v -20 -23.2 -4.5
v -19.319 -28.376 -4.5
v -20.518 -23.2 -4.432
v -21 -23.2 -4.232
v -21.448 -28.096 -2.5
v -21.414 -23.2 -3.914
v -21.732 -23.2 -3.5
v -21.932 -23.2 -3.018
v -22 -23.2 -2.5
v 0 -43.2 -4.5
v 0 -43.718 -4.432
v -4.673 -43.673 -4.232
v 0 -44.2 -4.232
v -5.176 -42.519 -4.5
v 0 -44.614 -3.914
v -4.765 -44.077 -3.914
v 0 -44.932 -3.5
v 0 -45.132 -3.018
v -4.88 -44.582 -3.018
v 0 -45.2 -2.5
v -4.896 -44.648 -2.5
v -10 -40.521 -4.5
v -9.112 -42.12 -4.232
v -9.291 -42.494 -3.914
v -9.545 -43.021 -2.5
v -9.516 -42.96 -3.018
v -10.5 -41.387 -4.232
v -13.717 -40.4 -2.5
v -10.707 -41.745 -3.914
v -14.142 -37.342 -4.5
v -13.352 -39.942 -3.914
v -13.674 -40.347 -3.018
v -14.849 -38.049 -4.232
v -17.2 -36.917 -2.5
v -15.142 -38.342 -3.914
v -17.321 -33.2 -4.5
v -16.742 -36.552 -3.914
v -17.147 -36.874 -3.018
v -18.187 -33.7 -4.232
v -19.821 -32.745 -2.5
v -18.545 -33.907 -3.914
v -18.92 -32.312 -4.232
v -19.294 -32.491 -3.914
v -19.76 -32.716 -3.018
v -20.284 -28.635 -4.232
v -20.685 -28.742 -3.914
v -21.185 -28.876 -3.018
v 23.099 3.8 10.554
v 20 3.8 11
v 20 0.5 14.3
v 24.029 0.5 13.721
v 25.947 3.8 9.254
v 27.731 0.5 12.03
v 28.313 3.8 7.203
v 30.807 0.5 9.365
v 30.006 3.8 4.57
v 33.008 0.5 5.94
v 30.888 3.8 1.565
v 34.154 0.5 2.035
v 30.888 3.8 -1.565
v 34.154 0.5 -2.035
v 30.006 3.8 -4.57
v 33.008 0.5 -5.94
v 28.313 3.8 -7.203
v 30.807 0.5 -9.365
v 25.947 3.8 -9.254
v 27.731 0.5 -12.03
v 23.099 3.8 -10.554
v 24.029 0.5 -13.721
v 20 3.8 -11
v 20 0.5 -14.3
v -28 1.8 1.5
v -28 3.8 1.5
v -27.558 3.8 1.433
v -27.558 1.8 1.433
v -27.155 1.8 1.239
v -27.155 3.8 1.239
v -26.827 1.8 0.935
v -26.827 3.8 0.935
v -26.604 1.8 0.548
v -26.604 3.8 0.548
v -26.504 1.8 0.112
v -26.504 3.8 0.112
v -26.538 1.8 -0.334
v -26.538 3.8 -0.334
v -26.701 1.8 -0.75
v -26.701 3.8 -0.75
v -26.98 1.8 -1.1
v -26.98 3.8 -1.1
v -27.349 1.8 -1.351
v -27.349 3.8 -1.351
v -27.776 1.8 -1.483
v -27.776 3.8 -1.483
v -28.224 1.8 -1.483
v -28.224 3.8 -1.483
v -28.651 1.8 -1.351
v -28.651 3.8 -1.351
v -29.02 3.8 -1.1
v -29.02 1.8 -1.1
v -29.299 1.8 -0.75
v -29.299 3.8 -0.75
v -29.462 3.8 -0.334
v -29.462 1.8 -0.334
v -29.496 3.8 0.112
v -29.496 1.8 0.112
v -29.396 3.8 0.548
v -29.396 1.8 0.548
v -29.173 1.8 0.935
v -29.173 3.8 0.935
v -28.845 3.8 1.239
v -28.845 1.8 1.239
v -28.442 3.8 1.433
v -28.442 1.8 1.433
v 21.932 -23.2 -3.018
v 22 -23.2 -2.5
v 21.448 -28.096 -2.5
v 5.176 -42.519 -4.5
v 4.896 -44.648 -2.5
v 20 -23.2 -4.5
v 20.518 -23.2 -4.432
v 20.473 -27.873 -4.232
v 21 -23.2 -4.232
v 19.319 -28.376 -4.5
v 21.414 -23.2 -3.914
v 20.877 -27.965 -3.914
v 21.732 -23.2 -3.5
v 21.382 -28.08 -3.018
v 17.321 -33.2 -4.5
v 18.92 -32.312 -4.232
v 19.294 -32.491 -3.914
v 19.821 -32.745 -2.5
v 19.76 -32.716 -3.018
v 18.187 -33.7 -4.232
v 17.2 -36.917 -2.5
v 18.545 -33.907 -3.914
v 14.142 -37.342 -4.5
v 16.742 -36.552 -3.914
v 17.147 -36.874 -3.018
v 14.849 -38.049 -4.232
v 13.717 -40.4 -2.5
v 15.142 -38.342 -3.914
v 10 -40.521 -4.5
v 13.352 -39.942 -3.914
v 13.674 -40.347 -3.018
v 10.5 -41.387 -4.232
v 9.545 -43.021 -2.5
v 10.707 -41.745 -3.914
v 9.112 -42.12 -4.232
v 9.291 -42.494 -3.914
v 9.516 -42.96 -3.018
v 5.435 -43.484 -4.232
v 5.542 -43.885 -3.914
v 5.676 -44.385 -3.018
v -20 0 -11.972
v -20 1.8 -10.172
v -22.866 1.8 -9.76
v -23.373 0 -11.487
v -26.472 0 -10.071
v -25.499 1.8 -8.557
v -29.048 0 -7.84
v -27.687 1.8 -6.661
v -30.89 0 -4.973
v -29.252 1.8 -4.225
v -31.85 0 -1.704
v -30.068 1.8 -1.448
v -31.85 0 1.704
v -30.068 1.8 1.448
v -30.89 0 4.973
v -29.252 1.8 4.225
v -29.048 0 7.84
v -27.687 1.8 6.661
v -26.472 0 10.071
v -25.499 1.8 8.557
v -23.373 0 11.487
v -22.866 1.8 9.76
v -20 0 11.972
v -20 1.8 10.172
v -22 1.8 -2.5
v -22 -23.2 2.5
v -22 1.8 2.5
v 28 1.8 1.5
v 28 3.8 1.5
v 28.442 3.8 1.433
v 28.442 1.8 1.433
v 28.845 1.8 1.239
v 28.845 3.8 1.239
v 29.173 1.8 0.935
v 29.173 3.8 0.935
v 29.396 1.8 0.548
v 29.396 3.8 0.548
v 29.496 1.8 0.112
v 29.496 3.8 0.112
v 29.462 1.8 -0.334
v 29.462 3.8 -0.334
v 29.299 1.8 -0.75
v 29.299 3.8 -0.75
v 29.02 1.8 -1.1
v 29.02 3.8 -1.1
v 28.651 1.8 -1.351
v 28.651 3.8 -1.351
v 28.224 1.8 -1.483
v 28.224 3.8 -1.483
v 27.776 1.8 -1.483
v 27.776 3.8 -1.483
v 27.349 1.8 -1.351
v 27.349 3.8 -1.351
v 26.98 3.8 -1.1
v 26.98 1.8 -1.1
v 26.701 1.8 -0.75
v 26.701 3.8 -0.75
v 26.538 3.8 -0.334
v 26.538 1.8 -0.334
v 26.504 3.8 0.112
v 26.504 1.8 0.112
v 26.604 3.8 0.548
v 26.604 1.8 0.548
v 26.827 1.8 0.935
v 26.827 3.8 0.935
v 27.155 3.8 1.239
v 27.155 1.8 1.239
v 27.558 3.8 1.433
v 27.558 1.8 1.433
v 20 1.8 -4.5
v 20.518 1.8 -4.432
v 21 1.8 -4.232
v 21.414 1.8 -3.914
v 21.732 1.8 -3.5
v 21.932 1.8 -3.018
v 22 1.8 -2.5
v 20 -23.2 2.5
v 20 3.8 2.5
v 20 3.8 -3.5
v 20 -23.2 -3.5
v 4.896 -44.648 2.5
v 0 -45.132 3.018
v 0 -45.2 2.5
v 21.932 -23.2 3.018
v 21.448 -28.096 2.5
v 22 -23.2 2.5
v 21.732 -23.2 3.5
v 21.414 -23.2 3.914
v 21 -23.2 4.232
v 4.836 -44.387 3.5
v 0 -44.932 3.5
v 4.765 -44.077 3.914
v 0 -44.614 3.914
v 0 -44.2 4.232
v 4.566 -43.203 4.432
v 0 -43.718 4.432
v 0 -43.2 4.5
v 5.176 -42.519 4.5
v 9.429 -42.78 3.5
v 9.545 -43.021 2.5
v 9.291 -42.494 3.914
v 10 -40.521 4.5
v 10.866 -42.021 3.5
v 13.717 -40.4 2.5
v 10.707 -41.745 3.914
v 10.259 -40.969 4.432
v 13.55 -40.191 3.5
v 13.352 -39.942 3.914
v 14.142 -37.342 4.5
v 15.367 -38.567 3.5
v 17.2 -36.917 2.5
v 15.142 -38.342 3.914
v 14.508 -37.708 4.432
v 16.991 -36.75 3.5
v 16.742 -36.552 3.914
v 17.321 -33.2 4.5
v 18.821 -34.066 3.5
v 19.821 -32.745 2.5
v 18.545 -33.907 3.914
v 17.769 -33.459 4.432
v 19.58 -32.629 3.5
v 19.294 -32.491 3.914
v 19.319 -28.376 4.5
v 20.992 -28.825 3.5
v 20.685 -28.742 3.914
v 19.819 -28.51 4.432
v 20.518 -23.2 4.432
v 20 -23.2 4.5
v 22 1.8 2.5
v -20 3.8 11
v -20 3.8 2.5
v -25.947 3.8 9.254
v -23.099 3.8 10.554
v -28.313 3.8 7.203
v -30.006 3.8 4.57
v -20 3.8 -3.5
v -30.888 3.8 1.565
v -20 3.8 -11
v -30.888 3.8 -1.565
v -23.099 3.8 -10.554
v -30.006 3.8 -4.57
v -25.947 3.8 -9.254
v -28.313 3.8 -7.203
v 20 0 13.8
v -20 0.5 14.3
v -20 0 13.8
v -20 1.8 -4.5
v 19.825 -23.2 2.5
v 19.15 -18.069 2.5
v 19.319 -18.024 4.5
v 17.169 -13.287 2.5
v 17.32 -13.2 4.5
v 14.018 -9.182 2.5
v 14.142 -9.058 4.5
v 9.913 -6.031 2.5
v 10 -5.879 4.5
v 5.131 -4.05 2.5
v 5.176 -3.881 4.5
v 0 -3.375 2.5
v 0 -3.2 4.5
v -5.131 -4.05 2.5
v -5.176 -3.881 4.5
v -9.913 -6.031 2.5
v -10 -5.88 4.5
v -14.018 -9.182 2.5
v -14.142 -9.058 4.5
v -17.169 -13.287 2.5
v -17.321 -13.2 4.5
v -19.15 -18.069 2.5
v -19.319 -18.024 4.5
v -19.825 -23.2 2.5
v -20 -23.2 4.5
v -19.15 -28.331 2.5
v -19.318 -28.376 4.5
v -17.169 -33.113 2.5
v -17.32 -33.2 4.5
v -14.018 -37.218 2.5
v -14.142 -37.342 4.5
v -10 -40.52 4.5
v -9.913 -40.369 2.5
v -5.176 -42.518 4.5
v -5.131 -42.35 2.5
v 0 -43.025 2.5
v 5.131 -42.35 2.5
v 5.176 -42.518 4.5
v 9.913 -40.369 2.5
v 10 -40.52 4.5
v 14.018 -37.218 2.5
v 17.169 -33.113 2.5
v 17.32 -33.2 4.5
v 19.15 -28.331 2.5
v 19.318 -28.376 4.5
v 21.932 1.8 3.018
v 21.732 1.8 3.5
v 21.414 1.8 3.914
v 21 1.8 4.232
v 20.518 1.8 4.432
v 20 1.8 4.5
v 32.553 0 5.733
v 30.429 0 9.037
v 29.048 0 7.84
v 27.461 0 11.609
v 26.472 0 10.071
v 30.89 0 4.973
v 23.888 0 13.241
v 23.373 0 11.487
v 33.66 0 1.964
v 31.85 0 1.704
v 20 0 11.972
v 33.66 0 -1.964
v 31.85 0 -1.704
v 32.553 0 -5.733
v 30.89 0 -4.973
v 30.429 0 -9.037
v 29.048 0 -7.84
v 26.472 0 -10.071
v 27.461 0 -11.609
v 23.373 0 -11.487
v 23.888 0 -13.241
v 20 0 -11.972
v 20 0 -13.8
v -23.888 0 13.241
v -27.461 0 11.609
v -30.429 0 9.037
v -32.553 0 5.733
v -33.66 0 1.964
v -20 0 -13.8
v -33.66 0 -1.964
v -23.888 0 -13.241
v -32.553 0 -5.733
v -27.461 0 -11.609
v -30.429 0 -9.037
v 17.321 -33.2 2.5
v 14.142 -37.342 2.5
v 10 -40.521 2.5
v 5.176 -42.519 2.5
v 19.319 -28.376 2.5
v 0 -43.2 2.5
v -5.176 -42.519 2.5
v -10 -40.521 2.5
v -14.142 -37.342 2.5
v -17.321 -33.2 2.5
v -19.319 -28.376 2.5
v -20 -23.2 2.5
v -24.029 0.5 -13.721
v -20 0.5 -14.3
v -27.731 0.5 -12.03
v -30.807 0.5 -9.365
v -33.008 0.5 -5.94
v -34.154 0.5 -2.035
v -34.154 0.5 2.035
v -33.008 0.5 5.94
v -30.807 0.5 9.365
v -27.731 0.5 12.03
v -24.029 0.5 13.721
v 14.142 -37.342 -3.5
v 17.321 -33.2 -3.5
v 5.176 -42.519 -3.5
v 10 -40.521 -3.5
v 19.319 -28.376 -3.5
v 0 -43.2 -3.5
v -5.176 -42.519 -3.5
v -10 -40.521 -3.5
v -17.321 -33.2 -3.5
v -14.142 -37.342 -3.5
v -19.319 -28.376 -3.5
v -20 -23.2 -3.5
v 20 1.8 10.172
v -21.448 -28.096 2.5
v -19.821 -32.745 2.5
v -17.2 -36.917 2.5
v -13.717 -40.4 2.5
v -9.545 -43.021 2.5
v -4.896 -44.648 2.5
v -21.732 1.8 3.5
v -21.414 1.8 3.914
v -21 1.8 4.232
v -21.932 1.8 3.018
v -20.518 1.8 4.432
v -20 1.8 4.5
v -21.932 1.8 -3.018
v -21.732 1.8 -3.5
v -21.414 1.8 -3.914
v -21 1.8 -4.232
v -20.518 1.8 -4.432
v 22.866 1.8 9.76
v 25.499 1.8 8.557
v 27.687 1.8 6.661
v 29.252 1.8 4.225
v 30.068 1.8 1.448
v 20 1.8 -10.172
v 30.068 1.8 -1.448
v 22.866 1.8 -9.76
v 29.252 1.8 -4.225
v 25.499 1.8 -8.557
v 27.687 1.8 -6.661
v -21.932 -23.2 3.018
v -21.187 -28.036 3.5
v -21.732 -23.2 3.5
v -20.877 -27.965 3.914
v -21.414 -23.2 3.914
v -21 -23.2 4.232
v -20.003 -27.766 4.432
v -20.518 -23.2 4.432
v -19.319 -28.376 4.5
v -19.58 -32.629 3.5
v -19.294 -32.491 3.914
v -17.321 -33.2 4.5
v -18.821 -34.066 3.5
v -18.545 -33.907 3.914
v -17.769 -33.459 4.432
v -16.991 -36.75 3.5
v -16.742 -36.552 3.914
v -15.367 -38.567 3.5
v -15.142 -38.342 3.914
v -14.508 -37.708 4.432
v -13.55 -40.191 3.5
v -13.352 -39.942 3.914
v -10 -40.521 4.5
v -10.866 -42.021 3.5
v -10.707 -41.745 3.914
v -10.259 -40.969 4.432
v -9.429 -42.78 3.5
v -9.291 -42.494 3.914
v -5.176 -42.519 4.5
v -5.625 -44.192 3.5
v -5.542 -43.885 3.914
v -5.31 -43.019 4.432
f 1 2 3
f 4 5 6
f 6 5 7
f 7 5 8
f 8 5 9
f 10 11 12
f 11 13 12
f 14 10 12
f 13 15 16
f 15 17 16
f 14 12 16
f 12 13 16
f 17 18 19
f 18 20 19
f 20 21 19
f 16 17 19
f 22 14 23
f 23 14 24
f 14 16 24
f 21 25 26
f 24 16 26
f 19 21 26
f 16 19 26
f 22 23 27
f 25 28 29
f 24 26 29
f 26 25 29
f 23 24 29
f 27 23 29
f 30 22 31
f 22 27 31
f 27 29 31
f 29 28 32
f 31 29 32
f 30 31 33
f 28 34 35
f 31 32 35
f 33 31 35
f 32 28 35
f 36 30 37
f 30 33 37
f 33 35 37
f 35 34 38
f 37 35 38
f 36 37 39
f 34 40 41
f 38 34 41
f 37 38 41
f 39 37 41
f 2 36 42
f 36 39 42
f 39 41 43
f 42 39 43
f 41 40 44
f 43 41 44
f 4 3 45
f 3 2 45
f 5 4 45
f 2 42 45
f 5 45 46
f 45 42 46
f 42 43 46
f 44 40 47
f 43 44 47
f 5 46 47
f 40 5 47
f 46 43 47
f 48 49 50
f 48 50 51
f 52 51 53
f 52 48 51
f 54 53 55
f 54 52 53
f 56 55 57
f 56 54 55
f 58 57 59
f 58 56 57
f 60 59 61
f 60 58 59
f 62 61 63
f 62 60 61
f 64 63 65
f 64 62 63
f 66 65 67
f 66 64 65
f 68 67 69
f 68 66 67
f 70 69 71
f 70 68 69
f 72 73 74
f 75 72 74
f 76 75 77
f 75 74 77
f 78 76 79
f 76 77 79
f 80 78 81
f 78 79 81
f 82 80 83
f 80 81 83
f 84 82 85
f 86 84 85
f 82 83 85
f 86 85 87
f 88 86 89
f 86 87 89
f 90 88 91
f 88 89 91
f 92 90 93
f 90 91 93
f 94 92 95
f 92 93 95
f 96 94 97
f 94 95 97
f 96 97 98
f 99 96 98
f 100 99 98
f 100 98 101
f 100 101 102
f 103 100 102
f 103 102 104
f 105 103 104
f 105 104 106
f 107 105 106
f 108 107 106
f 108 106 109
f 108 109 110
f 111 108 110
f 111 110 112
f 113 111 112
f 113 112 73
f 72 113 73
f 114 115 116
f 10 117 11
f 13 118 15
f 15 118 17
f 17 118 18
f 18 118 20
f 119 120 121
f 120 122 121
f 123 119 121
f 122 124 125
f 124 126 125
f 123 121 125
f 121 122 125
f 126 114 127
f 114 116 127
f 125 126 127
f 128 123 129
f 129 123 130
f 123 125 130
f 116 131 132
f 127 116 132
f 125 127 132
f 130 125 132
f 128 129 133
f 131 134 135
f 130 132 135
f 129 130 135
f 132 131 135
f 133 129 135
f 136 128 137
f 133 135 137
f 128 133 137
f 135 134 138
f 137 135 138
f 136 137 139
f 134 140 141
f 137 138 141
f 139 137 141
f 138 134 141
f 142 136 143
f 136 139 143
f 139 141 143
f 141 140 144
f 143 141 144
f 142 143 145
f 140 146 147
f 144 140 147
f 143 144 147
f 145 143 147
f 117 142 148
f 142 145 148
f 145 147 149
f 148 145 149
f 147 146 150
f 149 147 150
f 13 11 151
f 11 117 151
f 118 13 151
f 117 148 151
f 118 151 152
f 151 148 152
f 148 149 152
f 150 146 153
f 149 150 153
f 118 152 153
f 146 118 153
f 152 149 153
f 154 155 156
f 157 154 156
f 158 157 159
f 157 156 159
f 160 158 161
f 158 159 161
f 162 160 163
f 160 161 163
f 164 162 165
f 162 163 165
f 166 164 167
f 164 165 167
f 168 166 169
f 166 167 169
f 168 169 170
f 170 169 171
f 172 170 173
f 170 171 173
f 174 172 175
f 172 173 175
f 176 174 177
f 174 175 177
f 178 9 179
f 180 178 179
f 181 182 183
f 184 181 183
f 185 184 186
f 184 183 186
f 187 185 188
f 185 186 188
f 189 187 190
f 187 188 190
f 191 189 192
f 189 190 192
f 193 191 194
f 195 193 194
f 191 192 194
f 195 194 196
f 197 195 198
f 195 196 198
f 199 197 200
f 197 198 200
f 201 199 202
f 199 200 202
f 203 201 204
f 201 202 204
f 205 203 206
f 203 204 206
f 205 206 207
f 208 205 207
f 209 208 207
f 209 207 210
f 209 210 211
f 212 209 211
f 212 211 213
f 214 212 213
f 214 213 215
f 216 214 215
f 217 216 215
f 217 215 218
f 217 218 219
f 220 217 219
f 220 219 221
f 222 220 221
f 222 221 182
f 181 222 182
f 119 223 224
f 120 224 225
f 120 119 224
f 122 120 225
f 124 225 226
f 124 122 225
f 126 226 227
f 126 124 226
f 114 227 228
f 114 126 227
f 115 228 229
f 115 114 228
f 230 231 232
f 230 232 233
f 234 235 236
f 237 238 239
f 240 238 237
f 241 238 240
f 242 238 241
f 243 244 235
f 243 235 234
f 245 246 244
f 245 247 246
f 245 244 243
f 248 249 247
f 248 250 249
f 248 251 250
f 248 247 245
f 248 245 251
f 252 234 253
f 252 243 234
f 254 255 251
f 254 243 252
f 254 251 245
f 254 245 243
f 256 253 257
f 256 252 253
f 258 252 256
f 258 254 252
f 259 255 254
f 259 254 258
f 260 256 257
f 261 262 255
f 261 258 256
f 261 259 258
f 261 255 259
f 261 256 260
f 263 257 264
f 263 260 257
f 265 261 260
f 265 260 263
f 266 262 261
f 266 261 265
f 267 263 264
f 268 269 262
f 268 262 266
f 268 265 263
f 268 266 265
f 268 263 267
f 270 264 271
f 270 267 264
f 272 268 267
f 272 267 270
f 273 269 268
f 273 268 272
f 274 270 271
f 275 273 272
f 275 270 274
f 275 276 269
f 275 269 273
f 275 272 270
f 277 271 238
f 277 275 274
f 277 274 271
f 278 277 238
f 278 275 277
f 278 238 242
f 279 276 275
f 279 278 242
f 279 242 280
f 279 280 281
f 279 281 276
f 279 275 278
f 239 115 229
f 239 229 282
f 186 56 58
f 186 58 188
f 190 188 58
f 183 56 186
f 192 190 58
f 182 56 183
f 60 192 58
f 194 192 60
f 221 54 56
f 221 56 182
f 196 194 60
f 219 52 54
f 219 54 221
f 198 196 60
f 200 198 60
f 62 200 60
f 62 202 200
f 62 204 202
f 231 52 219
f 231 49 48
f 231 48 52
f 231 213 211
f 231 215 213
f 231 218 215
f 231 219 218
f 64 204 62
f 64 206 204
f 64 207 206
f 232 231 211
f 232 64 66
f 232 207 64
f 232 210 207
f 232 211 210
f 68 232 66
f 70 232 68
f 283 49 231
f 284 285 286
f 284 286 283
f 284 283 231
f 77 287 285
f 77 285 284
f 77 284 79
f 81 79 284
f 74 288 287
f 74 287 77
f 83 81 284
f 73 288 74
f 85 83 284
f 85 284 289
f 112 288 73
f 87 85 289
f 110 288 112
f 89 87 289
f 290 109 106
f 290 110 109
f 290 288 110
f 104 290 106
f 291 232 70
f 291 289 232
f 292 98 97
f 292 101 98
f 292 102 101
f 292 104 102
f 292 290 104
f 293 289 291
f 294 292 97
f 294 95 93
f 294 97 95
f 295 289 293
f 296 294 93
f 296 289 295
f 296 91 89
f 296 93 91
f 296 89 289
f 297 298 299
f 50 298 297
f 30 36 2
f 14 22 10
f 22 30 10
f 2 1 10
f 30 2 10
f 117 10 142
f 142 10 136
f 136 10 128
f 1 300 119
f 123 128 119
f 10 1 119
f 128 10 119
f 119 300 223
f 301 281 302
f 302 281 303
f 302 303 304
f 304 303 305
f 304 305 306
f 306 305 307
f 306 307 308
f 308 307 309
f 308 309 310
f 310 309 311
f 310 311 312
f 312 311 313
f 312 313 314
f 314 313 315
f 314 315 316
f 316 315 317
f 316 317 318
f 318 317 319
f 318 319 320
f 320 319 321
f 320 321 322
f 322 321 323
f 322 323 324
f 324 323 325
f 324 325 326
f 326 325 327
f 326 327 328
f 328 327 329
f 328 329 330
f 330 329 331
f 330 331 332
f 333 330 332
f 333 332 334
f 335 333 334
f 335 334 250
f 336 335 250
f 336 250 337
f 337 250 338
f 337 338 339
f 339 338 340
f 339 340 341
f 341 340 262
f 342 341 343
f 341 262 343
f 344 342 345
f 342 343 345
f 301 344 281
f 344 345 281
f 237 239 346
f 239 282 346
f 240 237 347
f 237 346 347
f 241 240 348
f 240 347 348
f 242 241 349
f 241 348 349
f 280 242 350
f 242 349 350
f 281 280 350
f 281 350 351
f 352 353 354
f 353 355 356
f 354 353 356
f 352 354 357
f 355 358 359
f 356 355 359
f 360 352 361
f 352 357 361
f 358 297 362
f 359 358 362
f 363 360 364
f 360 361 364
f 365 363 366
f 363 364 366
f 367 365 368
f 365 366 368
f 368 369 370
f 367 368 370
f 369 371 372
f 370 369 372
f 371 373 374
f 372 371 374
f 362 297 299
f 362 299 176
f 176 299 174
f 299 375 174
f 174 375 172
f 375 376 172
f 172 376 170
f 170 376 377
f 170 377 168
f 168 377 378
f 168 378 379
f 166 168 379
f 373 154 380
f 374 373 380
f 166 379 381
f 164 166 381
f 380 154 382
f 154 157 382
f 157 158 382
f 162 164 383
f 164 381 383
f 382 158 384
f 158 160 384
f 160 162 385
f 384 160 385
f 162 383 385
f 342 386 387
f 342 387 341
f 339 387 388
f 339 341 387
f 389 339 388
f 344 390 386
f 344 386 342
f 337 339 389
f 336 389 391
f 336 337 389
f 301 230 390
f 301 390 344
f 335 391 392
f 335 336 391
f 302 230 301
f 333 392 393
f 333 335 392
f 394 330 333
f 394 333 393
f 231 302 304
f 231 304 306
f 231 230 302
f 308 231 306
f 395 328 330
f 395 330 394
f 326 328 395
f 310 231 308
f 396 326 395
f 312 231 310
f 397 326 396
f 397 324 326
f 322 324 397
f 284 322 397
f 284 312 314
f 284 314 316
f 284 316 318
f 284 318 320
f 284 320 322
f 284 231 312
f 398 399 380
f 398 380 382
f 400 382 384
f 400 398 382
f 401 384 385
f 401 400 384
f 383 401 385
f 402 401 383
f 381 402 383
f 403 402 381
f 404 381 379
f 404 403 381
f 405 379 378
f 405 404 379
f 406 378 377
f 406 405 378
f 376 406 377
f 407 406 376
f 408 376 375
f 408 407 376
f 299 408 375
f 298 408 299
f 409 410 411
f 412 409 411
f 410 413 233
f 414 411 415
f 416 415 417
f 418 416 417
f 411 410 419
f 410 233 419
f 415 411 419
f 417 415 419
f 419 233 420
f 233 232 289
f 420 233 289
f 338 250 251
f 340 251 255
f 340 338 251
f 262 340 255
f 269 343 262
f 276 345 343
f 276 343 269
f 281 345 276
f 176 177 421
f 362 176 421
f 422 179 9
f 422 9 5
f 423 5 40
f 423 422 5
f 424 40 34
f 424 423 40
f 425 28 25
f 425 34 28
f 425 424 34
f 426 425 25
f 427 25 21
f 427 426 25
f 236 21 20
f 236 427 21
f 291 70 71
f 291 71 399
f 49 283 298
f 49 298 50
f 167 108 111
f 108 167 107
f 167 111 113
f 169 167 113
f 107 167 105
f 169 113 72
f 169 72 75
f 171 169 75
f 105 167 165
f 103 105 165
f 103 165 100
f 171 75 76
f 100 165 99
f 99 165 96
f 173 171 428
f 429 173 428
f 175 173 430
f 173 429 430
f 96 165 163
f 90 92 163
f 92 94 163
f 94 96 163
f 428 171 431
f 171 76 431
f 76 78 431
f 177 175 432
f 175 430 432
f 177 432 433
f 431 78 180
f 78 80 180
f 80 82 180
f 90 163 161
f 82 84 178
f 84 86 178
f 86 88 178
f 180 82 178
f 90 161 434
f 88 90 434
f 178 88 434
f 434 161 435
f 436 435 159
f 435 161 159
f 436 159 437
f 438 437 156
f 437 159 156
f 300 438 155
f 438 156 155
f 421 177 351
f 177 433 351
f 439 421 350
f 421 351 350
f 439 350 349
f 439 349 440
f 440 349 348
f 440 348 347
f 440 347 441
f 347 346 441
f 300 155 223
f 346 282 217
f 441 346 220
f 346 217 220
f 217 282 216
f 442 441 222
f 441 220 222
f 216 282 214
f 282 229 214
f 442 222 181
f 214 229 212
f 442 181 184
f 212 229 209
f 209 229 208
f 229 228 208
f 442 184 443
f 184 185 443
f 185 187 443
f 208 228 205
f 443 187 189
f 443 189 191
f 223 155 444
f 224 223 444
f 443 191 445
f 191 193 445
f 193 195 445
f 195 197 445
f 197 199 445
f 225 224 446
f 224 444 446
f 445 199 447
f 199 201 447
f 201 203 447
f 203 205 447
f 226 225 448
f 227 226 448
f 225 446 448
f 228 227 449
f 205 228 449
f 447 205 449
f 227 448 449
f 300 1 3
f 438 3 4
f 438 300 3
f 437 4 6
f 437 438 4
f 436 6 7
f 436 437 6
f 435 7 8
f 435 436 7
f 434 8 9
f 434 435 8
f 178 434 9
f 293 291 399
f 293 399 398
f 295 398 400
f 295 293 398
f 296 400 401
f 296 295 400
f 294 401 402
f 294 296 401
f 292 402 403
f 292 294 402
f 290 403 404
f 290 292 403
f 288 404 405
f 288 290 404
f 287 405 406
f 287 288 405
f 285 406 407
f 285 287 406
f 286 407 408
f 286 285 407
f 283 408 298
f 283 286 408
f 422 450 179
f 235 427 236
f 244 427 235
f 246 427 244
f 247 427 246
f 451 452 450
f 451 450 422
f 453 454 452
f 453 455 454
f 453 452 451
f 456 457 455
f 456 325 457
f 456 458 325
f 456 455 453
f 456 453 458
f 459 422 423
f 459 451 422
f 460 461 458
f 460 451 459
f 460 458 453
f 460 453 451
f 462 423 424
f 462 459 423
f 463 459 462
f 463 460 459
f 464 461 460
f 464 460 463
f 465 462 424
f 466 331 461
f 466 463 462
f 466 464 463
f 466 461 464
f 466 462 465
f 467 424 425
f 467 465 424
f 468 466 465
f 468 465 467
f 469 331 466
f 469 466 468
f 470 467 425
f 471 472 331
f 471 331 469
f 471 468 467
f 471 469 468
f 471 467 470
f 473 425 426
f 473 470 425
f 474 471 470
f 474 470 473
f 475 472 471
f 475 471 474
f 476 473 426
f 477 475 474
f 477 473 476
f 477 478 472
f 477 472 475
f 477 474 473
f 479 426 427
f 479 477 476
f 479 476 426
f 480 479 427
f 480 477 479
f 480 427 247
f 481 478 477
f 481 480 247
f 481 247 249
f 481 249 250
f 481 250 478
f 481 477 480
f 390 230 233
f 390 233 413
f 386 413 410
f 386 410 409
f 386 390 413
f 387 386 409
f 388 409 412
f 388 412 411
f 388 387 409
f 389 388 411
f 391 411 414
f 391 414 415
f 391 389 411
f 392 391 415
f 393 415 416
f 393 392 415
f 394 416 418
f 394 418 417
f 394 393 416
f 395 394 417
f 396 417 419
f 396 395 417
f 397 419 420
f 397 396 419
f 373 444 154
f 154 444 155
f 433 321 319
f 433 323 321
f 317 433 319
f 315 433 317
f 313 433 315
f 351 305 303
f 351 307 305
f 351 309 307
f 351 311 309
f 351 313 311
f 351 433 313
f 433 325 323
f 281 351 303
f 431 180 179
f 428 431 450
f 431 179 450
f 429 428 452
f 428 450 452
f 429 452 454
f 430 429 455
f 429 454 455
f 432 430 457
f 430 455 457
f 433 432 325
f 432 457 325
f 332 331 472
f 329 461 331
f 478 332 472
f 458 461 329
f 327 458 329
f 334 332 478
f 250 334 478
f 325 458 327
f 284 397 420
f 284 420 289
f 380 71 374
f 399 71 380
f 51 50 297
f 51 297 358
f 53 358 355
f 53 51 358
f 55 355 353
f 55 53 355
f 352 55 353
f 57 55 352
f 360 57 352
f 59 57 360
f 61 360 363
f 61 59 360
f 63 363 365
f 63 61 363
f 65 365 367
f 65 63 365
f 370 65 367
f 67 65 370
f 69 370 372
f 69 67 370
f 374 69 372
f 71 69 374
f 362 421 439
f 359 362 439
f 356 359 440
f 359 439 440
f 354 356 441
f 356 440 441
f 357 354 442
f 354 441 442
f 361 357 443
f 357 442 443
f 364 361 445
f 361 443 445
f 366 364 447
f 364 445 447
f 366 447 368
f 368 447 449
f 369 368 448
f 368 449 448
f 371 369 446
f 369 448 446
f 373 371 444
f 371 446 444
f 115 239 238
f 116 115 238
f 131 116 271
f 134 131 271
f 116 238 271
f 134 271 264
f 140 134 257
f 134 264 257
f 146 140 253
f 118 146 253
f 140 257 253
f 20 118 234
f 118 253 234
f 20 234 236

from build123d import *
from OCP.BRepFilletAPI import BRepFilletAPI_MakeChamfer

# Parameters (mm, degrees)
BOSS_EXTRU_1_DEPTH      = 3.8
BOSS_EXTRU_1_TAPER      = 45
COQUE2_DEPTH            = 1.8
COQUE2_DRAFT            = 45
CHANFREIN1_SIZE         = 1
CHANFREIN1_SIZE2        = 0.707106781
ENL_V_MAT_EXTRU_1_REACH = 39.355
ESQUISSE2_R             = 1.5
ESQUISSE3_W             = 44
ESQUISSE3_H             = 9
BOSS_EXTRU_4_DEPTH      = 47
CONG_1_R                = 22
CONG_2_R                = 2
ESQUISSE7_R             = 20
ENL_V_MAT_EXTRU_4_DEPTH = 2
ENL_V_MAT_EXTRU_4_DRAFT = -5
ENL_V_MAT_EXTRU_5_DEPTH = 6


# Read off the part's stored shape, not the designer's step: Coque2
with BuildPart() as part:
    # Esquisse1 → Boss.-Extru.1 (new body)
    with BuildSketch(Plane(origin=(0, 0, 0), x_dir=(1, 0, 0), z_dir=(0, 1, 0))):
        with BuildLine():
            ThreePointArc((-20, 14.8), (-34.8, 0), (-20, -14.8))
            Line((-20, -14.8), (20, -14.8))
            ThreePointArc((20, -14.8), (34.8, 0), (20, 14.8))
            Line((20, 14.8), (-20, 14.8))
        make_face()
    extrude(amount=BOSS_EXTRU_1_DEPTH, taper=BOSS_EXTRU_1_TAPER)


with BuildPart() as coque2_tool:
    # Coque2 outline → Coque2 (with draft: the straight prism first)
    with BuildSketch(Plane(origin=(0, 1.8, 0), x_dir=(1, 0, 0), z_dir=(0, 1, 0))):
        with BuildLine():
            Line((-20, -10.171572875), (20, -10.171572875))
            ThreePointArc((20, -10.171572875), (30.171572875, 0), (20, 10.171572875))
            Line((20, 10.171572875), (-20, 10.171572875))
            ThreePointArc((-20, 10.171572875), (-30.171572875, 0), (-20, -10.171572875))
        make_face()
    extrude(amount=-COQUE2_DEPTH)
    # Coque2: the draft: its side faces are tilted about the plane it starts from
    coque2_sides = [coque2_tool.faces().sort_by_distance(p)[0] for p in [
        (0, 0.9, 10.171572875),
        (30.171572875, 0.9, 0),
        (0, 0.9, -10.171572875),
        (-30.171572875, 0.9, 0),
    ]]
    draft(coque2_sides, Plane(origin=(0, 1.8, 0), x_dir=(1, 0, 0), z_dir=(0, 1, 0)), COQUE2_DRAFT)


with BuildPart() as part_1:
    add(part.part)

    # Coque2: cut by coque2_tool
    add(coque2_tool.part, mode=Mode.SUBTRACT)

    # Chanfrein1: one chamfer whose edges measure the first distance from different faces: ONE call of the kernel's chamfer builder (chamfer() names one face for all edges)
    chanfrein1_edges_1 = [part_1.edges().sort_by_distance(p)[0] for p in [
        (0, 0, -14.8),
        (0, 0, 14.8),
        (-34.8, 0, 0),
    ]]
    chanfrein1_side_1 = [part_1.faces().sort_by_distance(p)[0] for p in [
        (0, 0, -14.043672029),
    ]]
    chanfrein1_edges_2 = [part_1.edges().sort_by_distance(p)[0] for p in [
        (34.8, 0, 0),
    ]]
    chanfrein1_side_2 = [part_1.faces().sort_by_distance(p)[0] for p in [
        (32.9, 1.9, 0),
    ]]
    chanfrein1 = BRepFilletAPI_MakeChamfer(part_1.part.solid().wrapped)
    for e in chanfrein1_edges_1:
        chanfrein1.Add(CHANFREIN1_SIZE, CHANFREIN1_SIZE2, e.wrapped, chanfrein1_side_1[0].wrapped)  # the first distance lies on this face
    for e in chanfrein1_edges_2:
        chanfrein1.Add(CHANFREIN1_SIZE, CHANFREIN1_SIZE2, e.wrapped, chanfrein1_side_2[0].wrapped)  # the first distance lies on this face
    add(Compound.cast(chanfrein1.Shape()), mode=Mode.REPLACE)

    # Esquisse2 → Enlèv. mat.-Extru.1 (cut, up to next)
    with BuildSketch(Plane(origin=(0, 3.8, 0), x_dir=(1, 0, 0), z_dir=(0, 1, 0)), mode=Mode.PRIVATE) as enl_v_mat_extru_1_sk1:
        with Locations(Location((-28, 0, 0), (0, 0, 270))):
            Circle(ESQUISSE2_R)
    enl_v_mat_extru_1_tool1 = extrude(enl_v_mat_extru_1_sk1.sketch, amount=-ENL_V_MAT_EXTRU_1_REACH, mode=Mode.PRIVATE) & part_1.part
    # Esquisse2 → Enlèv. mat.-Extru.1 (cut, up to next)
    with BuildSketch(Plane(origin=(0, 3.8, 0), x_dir=(1, 0, 0), z_dir=(0, 1, 0)), mode=Mode.PRIVATE) as enl_v_mat_extru_1_sk2:
        with Locations(Location((28, 0, 0), (0, 0, 270))):
            Circle(ESQUISSE2_R)
    enl_v_mat_extru_1_tool2 = extrude(enl_v_mat_extru_1_sk2.sketch, amount=-ENL_V_MAT_EXTRU_1_REACH, mode=Mode.PRIVATE) & part_1.part
    add(enl_v_mat_extru_1_tool1.solids().sort_by_distance((-28, 3.8, 0))[0], mode=Mode.SUBTRACT)
    add(enl_v_mat_extru_1_tool2.solids().sort_by_distance((28, 3.8, 0))[0], mode=Mode.SUBTRACT)

    # Esquisse3 → Boss.-Extru.4 (add)
    with BuildSketch(Plane.XZ.offset(-1.8)):
        Rectangle(ESQUISSE3_W, ESQUISSE3_H)
    extrude(amount=BOSS_EXTRU_4_DEPTH)

    # Congé1
    cong_1_edges = [part_1.edges().sort_by_distance(p)[0] for p in [
        (22, -45.2, 0),
        (-22, -45.2, 0),
    ]]
    fillet(cong_1_edges, radius=CONG_1_R - 0.0001)  # a hair under: the kernel refuses the full size

    # Congé2
    cong_2_edges = [part_1.edges().sort_by_distance(p)[0] for p in [
        (-22, -10.70005, 4.5),
        (22, -10.70005, 4.5),
        (-15.556378475, -38.756378475, 4.5),
        (15.556378475, -38.756378475, 4.5),
        (22, -10.70005, -4.5),
        (-22, -10.70005, -4.5),
        (-15.556378475, -38.756378475, -4.5),
        (15.556378475, -38.756378475, -4.5),
    ]]
    fillet(cong_2_edges, radius=CONG_2_R)


with BuildPart() as enl_v_mat_extru_4_tool:
    # Esquisse7 → Enlèv. mat.-Extru.4 (with draft: the straight prism first)
    with BuildSketch(Plane.XY.offset(4.5)):
        with Locations((0, -23.2)):
            Circle(ESQUISSE7_R)
    extrude(amount=-ENL_V_MAT_EXTRU_4_DEPTH)
    # Enlèv. mat.-Extru.4: the draft: its side faces are tilted about the plane it starts from
    enl_v_mat_extru_4_sides = [enl_v_mat_extru_4_tool.faces().sort_by_distance(p)[0] for p in [
        (-20, -23.2, 3.5),
    ]]
    draft(enl_v_mat_extru_4_sides, Plane.XY.offset(4.5), ENL_V_MAT_EXTRU_4_DRAFT)


with BuildPart() as part_2:
    add(part_1.part)

    # Enlèv. mat.-Extru.4: cut by enl_v_mat_extru_4_tool
    add(enl_v_mat_extru_4_tool.part, mode=Mode.SUBTRACT)

    # Esquisse9 → Enlèv. mat.-Extru.5 (cut)
    with BuildSketch(Plane.XY.offset(2.5)):
        with BuildLine():
            Line((-20, -23.2), (-20, 3.8))
            Line((-20, 3.8), (20, 3.8))
            Line((20, 3.8), (20, -23.2))
            ThreePointArc((20, -23.2), (0, -43.2), (-20, -23.2))
        make_face()
    extrude(amount=-ENL_V_MAT_EXTRU_5_DEPTH, mode=Mode.SUBTRACT)


solid = part_2.part
